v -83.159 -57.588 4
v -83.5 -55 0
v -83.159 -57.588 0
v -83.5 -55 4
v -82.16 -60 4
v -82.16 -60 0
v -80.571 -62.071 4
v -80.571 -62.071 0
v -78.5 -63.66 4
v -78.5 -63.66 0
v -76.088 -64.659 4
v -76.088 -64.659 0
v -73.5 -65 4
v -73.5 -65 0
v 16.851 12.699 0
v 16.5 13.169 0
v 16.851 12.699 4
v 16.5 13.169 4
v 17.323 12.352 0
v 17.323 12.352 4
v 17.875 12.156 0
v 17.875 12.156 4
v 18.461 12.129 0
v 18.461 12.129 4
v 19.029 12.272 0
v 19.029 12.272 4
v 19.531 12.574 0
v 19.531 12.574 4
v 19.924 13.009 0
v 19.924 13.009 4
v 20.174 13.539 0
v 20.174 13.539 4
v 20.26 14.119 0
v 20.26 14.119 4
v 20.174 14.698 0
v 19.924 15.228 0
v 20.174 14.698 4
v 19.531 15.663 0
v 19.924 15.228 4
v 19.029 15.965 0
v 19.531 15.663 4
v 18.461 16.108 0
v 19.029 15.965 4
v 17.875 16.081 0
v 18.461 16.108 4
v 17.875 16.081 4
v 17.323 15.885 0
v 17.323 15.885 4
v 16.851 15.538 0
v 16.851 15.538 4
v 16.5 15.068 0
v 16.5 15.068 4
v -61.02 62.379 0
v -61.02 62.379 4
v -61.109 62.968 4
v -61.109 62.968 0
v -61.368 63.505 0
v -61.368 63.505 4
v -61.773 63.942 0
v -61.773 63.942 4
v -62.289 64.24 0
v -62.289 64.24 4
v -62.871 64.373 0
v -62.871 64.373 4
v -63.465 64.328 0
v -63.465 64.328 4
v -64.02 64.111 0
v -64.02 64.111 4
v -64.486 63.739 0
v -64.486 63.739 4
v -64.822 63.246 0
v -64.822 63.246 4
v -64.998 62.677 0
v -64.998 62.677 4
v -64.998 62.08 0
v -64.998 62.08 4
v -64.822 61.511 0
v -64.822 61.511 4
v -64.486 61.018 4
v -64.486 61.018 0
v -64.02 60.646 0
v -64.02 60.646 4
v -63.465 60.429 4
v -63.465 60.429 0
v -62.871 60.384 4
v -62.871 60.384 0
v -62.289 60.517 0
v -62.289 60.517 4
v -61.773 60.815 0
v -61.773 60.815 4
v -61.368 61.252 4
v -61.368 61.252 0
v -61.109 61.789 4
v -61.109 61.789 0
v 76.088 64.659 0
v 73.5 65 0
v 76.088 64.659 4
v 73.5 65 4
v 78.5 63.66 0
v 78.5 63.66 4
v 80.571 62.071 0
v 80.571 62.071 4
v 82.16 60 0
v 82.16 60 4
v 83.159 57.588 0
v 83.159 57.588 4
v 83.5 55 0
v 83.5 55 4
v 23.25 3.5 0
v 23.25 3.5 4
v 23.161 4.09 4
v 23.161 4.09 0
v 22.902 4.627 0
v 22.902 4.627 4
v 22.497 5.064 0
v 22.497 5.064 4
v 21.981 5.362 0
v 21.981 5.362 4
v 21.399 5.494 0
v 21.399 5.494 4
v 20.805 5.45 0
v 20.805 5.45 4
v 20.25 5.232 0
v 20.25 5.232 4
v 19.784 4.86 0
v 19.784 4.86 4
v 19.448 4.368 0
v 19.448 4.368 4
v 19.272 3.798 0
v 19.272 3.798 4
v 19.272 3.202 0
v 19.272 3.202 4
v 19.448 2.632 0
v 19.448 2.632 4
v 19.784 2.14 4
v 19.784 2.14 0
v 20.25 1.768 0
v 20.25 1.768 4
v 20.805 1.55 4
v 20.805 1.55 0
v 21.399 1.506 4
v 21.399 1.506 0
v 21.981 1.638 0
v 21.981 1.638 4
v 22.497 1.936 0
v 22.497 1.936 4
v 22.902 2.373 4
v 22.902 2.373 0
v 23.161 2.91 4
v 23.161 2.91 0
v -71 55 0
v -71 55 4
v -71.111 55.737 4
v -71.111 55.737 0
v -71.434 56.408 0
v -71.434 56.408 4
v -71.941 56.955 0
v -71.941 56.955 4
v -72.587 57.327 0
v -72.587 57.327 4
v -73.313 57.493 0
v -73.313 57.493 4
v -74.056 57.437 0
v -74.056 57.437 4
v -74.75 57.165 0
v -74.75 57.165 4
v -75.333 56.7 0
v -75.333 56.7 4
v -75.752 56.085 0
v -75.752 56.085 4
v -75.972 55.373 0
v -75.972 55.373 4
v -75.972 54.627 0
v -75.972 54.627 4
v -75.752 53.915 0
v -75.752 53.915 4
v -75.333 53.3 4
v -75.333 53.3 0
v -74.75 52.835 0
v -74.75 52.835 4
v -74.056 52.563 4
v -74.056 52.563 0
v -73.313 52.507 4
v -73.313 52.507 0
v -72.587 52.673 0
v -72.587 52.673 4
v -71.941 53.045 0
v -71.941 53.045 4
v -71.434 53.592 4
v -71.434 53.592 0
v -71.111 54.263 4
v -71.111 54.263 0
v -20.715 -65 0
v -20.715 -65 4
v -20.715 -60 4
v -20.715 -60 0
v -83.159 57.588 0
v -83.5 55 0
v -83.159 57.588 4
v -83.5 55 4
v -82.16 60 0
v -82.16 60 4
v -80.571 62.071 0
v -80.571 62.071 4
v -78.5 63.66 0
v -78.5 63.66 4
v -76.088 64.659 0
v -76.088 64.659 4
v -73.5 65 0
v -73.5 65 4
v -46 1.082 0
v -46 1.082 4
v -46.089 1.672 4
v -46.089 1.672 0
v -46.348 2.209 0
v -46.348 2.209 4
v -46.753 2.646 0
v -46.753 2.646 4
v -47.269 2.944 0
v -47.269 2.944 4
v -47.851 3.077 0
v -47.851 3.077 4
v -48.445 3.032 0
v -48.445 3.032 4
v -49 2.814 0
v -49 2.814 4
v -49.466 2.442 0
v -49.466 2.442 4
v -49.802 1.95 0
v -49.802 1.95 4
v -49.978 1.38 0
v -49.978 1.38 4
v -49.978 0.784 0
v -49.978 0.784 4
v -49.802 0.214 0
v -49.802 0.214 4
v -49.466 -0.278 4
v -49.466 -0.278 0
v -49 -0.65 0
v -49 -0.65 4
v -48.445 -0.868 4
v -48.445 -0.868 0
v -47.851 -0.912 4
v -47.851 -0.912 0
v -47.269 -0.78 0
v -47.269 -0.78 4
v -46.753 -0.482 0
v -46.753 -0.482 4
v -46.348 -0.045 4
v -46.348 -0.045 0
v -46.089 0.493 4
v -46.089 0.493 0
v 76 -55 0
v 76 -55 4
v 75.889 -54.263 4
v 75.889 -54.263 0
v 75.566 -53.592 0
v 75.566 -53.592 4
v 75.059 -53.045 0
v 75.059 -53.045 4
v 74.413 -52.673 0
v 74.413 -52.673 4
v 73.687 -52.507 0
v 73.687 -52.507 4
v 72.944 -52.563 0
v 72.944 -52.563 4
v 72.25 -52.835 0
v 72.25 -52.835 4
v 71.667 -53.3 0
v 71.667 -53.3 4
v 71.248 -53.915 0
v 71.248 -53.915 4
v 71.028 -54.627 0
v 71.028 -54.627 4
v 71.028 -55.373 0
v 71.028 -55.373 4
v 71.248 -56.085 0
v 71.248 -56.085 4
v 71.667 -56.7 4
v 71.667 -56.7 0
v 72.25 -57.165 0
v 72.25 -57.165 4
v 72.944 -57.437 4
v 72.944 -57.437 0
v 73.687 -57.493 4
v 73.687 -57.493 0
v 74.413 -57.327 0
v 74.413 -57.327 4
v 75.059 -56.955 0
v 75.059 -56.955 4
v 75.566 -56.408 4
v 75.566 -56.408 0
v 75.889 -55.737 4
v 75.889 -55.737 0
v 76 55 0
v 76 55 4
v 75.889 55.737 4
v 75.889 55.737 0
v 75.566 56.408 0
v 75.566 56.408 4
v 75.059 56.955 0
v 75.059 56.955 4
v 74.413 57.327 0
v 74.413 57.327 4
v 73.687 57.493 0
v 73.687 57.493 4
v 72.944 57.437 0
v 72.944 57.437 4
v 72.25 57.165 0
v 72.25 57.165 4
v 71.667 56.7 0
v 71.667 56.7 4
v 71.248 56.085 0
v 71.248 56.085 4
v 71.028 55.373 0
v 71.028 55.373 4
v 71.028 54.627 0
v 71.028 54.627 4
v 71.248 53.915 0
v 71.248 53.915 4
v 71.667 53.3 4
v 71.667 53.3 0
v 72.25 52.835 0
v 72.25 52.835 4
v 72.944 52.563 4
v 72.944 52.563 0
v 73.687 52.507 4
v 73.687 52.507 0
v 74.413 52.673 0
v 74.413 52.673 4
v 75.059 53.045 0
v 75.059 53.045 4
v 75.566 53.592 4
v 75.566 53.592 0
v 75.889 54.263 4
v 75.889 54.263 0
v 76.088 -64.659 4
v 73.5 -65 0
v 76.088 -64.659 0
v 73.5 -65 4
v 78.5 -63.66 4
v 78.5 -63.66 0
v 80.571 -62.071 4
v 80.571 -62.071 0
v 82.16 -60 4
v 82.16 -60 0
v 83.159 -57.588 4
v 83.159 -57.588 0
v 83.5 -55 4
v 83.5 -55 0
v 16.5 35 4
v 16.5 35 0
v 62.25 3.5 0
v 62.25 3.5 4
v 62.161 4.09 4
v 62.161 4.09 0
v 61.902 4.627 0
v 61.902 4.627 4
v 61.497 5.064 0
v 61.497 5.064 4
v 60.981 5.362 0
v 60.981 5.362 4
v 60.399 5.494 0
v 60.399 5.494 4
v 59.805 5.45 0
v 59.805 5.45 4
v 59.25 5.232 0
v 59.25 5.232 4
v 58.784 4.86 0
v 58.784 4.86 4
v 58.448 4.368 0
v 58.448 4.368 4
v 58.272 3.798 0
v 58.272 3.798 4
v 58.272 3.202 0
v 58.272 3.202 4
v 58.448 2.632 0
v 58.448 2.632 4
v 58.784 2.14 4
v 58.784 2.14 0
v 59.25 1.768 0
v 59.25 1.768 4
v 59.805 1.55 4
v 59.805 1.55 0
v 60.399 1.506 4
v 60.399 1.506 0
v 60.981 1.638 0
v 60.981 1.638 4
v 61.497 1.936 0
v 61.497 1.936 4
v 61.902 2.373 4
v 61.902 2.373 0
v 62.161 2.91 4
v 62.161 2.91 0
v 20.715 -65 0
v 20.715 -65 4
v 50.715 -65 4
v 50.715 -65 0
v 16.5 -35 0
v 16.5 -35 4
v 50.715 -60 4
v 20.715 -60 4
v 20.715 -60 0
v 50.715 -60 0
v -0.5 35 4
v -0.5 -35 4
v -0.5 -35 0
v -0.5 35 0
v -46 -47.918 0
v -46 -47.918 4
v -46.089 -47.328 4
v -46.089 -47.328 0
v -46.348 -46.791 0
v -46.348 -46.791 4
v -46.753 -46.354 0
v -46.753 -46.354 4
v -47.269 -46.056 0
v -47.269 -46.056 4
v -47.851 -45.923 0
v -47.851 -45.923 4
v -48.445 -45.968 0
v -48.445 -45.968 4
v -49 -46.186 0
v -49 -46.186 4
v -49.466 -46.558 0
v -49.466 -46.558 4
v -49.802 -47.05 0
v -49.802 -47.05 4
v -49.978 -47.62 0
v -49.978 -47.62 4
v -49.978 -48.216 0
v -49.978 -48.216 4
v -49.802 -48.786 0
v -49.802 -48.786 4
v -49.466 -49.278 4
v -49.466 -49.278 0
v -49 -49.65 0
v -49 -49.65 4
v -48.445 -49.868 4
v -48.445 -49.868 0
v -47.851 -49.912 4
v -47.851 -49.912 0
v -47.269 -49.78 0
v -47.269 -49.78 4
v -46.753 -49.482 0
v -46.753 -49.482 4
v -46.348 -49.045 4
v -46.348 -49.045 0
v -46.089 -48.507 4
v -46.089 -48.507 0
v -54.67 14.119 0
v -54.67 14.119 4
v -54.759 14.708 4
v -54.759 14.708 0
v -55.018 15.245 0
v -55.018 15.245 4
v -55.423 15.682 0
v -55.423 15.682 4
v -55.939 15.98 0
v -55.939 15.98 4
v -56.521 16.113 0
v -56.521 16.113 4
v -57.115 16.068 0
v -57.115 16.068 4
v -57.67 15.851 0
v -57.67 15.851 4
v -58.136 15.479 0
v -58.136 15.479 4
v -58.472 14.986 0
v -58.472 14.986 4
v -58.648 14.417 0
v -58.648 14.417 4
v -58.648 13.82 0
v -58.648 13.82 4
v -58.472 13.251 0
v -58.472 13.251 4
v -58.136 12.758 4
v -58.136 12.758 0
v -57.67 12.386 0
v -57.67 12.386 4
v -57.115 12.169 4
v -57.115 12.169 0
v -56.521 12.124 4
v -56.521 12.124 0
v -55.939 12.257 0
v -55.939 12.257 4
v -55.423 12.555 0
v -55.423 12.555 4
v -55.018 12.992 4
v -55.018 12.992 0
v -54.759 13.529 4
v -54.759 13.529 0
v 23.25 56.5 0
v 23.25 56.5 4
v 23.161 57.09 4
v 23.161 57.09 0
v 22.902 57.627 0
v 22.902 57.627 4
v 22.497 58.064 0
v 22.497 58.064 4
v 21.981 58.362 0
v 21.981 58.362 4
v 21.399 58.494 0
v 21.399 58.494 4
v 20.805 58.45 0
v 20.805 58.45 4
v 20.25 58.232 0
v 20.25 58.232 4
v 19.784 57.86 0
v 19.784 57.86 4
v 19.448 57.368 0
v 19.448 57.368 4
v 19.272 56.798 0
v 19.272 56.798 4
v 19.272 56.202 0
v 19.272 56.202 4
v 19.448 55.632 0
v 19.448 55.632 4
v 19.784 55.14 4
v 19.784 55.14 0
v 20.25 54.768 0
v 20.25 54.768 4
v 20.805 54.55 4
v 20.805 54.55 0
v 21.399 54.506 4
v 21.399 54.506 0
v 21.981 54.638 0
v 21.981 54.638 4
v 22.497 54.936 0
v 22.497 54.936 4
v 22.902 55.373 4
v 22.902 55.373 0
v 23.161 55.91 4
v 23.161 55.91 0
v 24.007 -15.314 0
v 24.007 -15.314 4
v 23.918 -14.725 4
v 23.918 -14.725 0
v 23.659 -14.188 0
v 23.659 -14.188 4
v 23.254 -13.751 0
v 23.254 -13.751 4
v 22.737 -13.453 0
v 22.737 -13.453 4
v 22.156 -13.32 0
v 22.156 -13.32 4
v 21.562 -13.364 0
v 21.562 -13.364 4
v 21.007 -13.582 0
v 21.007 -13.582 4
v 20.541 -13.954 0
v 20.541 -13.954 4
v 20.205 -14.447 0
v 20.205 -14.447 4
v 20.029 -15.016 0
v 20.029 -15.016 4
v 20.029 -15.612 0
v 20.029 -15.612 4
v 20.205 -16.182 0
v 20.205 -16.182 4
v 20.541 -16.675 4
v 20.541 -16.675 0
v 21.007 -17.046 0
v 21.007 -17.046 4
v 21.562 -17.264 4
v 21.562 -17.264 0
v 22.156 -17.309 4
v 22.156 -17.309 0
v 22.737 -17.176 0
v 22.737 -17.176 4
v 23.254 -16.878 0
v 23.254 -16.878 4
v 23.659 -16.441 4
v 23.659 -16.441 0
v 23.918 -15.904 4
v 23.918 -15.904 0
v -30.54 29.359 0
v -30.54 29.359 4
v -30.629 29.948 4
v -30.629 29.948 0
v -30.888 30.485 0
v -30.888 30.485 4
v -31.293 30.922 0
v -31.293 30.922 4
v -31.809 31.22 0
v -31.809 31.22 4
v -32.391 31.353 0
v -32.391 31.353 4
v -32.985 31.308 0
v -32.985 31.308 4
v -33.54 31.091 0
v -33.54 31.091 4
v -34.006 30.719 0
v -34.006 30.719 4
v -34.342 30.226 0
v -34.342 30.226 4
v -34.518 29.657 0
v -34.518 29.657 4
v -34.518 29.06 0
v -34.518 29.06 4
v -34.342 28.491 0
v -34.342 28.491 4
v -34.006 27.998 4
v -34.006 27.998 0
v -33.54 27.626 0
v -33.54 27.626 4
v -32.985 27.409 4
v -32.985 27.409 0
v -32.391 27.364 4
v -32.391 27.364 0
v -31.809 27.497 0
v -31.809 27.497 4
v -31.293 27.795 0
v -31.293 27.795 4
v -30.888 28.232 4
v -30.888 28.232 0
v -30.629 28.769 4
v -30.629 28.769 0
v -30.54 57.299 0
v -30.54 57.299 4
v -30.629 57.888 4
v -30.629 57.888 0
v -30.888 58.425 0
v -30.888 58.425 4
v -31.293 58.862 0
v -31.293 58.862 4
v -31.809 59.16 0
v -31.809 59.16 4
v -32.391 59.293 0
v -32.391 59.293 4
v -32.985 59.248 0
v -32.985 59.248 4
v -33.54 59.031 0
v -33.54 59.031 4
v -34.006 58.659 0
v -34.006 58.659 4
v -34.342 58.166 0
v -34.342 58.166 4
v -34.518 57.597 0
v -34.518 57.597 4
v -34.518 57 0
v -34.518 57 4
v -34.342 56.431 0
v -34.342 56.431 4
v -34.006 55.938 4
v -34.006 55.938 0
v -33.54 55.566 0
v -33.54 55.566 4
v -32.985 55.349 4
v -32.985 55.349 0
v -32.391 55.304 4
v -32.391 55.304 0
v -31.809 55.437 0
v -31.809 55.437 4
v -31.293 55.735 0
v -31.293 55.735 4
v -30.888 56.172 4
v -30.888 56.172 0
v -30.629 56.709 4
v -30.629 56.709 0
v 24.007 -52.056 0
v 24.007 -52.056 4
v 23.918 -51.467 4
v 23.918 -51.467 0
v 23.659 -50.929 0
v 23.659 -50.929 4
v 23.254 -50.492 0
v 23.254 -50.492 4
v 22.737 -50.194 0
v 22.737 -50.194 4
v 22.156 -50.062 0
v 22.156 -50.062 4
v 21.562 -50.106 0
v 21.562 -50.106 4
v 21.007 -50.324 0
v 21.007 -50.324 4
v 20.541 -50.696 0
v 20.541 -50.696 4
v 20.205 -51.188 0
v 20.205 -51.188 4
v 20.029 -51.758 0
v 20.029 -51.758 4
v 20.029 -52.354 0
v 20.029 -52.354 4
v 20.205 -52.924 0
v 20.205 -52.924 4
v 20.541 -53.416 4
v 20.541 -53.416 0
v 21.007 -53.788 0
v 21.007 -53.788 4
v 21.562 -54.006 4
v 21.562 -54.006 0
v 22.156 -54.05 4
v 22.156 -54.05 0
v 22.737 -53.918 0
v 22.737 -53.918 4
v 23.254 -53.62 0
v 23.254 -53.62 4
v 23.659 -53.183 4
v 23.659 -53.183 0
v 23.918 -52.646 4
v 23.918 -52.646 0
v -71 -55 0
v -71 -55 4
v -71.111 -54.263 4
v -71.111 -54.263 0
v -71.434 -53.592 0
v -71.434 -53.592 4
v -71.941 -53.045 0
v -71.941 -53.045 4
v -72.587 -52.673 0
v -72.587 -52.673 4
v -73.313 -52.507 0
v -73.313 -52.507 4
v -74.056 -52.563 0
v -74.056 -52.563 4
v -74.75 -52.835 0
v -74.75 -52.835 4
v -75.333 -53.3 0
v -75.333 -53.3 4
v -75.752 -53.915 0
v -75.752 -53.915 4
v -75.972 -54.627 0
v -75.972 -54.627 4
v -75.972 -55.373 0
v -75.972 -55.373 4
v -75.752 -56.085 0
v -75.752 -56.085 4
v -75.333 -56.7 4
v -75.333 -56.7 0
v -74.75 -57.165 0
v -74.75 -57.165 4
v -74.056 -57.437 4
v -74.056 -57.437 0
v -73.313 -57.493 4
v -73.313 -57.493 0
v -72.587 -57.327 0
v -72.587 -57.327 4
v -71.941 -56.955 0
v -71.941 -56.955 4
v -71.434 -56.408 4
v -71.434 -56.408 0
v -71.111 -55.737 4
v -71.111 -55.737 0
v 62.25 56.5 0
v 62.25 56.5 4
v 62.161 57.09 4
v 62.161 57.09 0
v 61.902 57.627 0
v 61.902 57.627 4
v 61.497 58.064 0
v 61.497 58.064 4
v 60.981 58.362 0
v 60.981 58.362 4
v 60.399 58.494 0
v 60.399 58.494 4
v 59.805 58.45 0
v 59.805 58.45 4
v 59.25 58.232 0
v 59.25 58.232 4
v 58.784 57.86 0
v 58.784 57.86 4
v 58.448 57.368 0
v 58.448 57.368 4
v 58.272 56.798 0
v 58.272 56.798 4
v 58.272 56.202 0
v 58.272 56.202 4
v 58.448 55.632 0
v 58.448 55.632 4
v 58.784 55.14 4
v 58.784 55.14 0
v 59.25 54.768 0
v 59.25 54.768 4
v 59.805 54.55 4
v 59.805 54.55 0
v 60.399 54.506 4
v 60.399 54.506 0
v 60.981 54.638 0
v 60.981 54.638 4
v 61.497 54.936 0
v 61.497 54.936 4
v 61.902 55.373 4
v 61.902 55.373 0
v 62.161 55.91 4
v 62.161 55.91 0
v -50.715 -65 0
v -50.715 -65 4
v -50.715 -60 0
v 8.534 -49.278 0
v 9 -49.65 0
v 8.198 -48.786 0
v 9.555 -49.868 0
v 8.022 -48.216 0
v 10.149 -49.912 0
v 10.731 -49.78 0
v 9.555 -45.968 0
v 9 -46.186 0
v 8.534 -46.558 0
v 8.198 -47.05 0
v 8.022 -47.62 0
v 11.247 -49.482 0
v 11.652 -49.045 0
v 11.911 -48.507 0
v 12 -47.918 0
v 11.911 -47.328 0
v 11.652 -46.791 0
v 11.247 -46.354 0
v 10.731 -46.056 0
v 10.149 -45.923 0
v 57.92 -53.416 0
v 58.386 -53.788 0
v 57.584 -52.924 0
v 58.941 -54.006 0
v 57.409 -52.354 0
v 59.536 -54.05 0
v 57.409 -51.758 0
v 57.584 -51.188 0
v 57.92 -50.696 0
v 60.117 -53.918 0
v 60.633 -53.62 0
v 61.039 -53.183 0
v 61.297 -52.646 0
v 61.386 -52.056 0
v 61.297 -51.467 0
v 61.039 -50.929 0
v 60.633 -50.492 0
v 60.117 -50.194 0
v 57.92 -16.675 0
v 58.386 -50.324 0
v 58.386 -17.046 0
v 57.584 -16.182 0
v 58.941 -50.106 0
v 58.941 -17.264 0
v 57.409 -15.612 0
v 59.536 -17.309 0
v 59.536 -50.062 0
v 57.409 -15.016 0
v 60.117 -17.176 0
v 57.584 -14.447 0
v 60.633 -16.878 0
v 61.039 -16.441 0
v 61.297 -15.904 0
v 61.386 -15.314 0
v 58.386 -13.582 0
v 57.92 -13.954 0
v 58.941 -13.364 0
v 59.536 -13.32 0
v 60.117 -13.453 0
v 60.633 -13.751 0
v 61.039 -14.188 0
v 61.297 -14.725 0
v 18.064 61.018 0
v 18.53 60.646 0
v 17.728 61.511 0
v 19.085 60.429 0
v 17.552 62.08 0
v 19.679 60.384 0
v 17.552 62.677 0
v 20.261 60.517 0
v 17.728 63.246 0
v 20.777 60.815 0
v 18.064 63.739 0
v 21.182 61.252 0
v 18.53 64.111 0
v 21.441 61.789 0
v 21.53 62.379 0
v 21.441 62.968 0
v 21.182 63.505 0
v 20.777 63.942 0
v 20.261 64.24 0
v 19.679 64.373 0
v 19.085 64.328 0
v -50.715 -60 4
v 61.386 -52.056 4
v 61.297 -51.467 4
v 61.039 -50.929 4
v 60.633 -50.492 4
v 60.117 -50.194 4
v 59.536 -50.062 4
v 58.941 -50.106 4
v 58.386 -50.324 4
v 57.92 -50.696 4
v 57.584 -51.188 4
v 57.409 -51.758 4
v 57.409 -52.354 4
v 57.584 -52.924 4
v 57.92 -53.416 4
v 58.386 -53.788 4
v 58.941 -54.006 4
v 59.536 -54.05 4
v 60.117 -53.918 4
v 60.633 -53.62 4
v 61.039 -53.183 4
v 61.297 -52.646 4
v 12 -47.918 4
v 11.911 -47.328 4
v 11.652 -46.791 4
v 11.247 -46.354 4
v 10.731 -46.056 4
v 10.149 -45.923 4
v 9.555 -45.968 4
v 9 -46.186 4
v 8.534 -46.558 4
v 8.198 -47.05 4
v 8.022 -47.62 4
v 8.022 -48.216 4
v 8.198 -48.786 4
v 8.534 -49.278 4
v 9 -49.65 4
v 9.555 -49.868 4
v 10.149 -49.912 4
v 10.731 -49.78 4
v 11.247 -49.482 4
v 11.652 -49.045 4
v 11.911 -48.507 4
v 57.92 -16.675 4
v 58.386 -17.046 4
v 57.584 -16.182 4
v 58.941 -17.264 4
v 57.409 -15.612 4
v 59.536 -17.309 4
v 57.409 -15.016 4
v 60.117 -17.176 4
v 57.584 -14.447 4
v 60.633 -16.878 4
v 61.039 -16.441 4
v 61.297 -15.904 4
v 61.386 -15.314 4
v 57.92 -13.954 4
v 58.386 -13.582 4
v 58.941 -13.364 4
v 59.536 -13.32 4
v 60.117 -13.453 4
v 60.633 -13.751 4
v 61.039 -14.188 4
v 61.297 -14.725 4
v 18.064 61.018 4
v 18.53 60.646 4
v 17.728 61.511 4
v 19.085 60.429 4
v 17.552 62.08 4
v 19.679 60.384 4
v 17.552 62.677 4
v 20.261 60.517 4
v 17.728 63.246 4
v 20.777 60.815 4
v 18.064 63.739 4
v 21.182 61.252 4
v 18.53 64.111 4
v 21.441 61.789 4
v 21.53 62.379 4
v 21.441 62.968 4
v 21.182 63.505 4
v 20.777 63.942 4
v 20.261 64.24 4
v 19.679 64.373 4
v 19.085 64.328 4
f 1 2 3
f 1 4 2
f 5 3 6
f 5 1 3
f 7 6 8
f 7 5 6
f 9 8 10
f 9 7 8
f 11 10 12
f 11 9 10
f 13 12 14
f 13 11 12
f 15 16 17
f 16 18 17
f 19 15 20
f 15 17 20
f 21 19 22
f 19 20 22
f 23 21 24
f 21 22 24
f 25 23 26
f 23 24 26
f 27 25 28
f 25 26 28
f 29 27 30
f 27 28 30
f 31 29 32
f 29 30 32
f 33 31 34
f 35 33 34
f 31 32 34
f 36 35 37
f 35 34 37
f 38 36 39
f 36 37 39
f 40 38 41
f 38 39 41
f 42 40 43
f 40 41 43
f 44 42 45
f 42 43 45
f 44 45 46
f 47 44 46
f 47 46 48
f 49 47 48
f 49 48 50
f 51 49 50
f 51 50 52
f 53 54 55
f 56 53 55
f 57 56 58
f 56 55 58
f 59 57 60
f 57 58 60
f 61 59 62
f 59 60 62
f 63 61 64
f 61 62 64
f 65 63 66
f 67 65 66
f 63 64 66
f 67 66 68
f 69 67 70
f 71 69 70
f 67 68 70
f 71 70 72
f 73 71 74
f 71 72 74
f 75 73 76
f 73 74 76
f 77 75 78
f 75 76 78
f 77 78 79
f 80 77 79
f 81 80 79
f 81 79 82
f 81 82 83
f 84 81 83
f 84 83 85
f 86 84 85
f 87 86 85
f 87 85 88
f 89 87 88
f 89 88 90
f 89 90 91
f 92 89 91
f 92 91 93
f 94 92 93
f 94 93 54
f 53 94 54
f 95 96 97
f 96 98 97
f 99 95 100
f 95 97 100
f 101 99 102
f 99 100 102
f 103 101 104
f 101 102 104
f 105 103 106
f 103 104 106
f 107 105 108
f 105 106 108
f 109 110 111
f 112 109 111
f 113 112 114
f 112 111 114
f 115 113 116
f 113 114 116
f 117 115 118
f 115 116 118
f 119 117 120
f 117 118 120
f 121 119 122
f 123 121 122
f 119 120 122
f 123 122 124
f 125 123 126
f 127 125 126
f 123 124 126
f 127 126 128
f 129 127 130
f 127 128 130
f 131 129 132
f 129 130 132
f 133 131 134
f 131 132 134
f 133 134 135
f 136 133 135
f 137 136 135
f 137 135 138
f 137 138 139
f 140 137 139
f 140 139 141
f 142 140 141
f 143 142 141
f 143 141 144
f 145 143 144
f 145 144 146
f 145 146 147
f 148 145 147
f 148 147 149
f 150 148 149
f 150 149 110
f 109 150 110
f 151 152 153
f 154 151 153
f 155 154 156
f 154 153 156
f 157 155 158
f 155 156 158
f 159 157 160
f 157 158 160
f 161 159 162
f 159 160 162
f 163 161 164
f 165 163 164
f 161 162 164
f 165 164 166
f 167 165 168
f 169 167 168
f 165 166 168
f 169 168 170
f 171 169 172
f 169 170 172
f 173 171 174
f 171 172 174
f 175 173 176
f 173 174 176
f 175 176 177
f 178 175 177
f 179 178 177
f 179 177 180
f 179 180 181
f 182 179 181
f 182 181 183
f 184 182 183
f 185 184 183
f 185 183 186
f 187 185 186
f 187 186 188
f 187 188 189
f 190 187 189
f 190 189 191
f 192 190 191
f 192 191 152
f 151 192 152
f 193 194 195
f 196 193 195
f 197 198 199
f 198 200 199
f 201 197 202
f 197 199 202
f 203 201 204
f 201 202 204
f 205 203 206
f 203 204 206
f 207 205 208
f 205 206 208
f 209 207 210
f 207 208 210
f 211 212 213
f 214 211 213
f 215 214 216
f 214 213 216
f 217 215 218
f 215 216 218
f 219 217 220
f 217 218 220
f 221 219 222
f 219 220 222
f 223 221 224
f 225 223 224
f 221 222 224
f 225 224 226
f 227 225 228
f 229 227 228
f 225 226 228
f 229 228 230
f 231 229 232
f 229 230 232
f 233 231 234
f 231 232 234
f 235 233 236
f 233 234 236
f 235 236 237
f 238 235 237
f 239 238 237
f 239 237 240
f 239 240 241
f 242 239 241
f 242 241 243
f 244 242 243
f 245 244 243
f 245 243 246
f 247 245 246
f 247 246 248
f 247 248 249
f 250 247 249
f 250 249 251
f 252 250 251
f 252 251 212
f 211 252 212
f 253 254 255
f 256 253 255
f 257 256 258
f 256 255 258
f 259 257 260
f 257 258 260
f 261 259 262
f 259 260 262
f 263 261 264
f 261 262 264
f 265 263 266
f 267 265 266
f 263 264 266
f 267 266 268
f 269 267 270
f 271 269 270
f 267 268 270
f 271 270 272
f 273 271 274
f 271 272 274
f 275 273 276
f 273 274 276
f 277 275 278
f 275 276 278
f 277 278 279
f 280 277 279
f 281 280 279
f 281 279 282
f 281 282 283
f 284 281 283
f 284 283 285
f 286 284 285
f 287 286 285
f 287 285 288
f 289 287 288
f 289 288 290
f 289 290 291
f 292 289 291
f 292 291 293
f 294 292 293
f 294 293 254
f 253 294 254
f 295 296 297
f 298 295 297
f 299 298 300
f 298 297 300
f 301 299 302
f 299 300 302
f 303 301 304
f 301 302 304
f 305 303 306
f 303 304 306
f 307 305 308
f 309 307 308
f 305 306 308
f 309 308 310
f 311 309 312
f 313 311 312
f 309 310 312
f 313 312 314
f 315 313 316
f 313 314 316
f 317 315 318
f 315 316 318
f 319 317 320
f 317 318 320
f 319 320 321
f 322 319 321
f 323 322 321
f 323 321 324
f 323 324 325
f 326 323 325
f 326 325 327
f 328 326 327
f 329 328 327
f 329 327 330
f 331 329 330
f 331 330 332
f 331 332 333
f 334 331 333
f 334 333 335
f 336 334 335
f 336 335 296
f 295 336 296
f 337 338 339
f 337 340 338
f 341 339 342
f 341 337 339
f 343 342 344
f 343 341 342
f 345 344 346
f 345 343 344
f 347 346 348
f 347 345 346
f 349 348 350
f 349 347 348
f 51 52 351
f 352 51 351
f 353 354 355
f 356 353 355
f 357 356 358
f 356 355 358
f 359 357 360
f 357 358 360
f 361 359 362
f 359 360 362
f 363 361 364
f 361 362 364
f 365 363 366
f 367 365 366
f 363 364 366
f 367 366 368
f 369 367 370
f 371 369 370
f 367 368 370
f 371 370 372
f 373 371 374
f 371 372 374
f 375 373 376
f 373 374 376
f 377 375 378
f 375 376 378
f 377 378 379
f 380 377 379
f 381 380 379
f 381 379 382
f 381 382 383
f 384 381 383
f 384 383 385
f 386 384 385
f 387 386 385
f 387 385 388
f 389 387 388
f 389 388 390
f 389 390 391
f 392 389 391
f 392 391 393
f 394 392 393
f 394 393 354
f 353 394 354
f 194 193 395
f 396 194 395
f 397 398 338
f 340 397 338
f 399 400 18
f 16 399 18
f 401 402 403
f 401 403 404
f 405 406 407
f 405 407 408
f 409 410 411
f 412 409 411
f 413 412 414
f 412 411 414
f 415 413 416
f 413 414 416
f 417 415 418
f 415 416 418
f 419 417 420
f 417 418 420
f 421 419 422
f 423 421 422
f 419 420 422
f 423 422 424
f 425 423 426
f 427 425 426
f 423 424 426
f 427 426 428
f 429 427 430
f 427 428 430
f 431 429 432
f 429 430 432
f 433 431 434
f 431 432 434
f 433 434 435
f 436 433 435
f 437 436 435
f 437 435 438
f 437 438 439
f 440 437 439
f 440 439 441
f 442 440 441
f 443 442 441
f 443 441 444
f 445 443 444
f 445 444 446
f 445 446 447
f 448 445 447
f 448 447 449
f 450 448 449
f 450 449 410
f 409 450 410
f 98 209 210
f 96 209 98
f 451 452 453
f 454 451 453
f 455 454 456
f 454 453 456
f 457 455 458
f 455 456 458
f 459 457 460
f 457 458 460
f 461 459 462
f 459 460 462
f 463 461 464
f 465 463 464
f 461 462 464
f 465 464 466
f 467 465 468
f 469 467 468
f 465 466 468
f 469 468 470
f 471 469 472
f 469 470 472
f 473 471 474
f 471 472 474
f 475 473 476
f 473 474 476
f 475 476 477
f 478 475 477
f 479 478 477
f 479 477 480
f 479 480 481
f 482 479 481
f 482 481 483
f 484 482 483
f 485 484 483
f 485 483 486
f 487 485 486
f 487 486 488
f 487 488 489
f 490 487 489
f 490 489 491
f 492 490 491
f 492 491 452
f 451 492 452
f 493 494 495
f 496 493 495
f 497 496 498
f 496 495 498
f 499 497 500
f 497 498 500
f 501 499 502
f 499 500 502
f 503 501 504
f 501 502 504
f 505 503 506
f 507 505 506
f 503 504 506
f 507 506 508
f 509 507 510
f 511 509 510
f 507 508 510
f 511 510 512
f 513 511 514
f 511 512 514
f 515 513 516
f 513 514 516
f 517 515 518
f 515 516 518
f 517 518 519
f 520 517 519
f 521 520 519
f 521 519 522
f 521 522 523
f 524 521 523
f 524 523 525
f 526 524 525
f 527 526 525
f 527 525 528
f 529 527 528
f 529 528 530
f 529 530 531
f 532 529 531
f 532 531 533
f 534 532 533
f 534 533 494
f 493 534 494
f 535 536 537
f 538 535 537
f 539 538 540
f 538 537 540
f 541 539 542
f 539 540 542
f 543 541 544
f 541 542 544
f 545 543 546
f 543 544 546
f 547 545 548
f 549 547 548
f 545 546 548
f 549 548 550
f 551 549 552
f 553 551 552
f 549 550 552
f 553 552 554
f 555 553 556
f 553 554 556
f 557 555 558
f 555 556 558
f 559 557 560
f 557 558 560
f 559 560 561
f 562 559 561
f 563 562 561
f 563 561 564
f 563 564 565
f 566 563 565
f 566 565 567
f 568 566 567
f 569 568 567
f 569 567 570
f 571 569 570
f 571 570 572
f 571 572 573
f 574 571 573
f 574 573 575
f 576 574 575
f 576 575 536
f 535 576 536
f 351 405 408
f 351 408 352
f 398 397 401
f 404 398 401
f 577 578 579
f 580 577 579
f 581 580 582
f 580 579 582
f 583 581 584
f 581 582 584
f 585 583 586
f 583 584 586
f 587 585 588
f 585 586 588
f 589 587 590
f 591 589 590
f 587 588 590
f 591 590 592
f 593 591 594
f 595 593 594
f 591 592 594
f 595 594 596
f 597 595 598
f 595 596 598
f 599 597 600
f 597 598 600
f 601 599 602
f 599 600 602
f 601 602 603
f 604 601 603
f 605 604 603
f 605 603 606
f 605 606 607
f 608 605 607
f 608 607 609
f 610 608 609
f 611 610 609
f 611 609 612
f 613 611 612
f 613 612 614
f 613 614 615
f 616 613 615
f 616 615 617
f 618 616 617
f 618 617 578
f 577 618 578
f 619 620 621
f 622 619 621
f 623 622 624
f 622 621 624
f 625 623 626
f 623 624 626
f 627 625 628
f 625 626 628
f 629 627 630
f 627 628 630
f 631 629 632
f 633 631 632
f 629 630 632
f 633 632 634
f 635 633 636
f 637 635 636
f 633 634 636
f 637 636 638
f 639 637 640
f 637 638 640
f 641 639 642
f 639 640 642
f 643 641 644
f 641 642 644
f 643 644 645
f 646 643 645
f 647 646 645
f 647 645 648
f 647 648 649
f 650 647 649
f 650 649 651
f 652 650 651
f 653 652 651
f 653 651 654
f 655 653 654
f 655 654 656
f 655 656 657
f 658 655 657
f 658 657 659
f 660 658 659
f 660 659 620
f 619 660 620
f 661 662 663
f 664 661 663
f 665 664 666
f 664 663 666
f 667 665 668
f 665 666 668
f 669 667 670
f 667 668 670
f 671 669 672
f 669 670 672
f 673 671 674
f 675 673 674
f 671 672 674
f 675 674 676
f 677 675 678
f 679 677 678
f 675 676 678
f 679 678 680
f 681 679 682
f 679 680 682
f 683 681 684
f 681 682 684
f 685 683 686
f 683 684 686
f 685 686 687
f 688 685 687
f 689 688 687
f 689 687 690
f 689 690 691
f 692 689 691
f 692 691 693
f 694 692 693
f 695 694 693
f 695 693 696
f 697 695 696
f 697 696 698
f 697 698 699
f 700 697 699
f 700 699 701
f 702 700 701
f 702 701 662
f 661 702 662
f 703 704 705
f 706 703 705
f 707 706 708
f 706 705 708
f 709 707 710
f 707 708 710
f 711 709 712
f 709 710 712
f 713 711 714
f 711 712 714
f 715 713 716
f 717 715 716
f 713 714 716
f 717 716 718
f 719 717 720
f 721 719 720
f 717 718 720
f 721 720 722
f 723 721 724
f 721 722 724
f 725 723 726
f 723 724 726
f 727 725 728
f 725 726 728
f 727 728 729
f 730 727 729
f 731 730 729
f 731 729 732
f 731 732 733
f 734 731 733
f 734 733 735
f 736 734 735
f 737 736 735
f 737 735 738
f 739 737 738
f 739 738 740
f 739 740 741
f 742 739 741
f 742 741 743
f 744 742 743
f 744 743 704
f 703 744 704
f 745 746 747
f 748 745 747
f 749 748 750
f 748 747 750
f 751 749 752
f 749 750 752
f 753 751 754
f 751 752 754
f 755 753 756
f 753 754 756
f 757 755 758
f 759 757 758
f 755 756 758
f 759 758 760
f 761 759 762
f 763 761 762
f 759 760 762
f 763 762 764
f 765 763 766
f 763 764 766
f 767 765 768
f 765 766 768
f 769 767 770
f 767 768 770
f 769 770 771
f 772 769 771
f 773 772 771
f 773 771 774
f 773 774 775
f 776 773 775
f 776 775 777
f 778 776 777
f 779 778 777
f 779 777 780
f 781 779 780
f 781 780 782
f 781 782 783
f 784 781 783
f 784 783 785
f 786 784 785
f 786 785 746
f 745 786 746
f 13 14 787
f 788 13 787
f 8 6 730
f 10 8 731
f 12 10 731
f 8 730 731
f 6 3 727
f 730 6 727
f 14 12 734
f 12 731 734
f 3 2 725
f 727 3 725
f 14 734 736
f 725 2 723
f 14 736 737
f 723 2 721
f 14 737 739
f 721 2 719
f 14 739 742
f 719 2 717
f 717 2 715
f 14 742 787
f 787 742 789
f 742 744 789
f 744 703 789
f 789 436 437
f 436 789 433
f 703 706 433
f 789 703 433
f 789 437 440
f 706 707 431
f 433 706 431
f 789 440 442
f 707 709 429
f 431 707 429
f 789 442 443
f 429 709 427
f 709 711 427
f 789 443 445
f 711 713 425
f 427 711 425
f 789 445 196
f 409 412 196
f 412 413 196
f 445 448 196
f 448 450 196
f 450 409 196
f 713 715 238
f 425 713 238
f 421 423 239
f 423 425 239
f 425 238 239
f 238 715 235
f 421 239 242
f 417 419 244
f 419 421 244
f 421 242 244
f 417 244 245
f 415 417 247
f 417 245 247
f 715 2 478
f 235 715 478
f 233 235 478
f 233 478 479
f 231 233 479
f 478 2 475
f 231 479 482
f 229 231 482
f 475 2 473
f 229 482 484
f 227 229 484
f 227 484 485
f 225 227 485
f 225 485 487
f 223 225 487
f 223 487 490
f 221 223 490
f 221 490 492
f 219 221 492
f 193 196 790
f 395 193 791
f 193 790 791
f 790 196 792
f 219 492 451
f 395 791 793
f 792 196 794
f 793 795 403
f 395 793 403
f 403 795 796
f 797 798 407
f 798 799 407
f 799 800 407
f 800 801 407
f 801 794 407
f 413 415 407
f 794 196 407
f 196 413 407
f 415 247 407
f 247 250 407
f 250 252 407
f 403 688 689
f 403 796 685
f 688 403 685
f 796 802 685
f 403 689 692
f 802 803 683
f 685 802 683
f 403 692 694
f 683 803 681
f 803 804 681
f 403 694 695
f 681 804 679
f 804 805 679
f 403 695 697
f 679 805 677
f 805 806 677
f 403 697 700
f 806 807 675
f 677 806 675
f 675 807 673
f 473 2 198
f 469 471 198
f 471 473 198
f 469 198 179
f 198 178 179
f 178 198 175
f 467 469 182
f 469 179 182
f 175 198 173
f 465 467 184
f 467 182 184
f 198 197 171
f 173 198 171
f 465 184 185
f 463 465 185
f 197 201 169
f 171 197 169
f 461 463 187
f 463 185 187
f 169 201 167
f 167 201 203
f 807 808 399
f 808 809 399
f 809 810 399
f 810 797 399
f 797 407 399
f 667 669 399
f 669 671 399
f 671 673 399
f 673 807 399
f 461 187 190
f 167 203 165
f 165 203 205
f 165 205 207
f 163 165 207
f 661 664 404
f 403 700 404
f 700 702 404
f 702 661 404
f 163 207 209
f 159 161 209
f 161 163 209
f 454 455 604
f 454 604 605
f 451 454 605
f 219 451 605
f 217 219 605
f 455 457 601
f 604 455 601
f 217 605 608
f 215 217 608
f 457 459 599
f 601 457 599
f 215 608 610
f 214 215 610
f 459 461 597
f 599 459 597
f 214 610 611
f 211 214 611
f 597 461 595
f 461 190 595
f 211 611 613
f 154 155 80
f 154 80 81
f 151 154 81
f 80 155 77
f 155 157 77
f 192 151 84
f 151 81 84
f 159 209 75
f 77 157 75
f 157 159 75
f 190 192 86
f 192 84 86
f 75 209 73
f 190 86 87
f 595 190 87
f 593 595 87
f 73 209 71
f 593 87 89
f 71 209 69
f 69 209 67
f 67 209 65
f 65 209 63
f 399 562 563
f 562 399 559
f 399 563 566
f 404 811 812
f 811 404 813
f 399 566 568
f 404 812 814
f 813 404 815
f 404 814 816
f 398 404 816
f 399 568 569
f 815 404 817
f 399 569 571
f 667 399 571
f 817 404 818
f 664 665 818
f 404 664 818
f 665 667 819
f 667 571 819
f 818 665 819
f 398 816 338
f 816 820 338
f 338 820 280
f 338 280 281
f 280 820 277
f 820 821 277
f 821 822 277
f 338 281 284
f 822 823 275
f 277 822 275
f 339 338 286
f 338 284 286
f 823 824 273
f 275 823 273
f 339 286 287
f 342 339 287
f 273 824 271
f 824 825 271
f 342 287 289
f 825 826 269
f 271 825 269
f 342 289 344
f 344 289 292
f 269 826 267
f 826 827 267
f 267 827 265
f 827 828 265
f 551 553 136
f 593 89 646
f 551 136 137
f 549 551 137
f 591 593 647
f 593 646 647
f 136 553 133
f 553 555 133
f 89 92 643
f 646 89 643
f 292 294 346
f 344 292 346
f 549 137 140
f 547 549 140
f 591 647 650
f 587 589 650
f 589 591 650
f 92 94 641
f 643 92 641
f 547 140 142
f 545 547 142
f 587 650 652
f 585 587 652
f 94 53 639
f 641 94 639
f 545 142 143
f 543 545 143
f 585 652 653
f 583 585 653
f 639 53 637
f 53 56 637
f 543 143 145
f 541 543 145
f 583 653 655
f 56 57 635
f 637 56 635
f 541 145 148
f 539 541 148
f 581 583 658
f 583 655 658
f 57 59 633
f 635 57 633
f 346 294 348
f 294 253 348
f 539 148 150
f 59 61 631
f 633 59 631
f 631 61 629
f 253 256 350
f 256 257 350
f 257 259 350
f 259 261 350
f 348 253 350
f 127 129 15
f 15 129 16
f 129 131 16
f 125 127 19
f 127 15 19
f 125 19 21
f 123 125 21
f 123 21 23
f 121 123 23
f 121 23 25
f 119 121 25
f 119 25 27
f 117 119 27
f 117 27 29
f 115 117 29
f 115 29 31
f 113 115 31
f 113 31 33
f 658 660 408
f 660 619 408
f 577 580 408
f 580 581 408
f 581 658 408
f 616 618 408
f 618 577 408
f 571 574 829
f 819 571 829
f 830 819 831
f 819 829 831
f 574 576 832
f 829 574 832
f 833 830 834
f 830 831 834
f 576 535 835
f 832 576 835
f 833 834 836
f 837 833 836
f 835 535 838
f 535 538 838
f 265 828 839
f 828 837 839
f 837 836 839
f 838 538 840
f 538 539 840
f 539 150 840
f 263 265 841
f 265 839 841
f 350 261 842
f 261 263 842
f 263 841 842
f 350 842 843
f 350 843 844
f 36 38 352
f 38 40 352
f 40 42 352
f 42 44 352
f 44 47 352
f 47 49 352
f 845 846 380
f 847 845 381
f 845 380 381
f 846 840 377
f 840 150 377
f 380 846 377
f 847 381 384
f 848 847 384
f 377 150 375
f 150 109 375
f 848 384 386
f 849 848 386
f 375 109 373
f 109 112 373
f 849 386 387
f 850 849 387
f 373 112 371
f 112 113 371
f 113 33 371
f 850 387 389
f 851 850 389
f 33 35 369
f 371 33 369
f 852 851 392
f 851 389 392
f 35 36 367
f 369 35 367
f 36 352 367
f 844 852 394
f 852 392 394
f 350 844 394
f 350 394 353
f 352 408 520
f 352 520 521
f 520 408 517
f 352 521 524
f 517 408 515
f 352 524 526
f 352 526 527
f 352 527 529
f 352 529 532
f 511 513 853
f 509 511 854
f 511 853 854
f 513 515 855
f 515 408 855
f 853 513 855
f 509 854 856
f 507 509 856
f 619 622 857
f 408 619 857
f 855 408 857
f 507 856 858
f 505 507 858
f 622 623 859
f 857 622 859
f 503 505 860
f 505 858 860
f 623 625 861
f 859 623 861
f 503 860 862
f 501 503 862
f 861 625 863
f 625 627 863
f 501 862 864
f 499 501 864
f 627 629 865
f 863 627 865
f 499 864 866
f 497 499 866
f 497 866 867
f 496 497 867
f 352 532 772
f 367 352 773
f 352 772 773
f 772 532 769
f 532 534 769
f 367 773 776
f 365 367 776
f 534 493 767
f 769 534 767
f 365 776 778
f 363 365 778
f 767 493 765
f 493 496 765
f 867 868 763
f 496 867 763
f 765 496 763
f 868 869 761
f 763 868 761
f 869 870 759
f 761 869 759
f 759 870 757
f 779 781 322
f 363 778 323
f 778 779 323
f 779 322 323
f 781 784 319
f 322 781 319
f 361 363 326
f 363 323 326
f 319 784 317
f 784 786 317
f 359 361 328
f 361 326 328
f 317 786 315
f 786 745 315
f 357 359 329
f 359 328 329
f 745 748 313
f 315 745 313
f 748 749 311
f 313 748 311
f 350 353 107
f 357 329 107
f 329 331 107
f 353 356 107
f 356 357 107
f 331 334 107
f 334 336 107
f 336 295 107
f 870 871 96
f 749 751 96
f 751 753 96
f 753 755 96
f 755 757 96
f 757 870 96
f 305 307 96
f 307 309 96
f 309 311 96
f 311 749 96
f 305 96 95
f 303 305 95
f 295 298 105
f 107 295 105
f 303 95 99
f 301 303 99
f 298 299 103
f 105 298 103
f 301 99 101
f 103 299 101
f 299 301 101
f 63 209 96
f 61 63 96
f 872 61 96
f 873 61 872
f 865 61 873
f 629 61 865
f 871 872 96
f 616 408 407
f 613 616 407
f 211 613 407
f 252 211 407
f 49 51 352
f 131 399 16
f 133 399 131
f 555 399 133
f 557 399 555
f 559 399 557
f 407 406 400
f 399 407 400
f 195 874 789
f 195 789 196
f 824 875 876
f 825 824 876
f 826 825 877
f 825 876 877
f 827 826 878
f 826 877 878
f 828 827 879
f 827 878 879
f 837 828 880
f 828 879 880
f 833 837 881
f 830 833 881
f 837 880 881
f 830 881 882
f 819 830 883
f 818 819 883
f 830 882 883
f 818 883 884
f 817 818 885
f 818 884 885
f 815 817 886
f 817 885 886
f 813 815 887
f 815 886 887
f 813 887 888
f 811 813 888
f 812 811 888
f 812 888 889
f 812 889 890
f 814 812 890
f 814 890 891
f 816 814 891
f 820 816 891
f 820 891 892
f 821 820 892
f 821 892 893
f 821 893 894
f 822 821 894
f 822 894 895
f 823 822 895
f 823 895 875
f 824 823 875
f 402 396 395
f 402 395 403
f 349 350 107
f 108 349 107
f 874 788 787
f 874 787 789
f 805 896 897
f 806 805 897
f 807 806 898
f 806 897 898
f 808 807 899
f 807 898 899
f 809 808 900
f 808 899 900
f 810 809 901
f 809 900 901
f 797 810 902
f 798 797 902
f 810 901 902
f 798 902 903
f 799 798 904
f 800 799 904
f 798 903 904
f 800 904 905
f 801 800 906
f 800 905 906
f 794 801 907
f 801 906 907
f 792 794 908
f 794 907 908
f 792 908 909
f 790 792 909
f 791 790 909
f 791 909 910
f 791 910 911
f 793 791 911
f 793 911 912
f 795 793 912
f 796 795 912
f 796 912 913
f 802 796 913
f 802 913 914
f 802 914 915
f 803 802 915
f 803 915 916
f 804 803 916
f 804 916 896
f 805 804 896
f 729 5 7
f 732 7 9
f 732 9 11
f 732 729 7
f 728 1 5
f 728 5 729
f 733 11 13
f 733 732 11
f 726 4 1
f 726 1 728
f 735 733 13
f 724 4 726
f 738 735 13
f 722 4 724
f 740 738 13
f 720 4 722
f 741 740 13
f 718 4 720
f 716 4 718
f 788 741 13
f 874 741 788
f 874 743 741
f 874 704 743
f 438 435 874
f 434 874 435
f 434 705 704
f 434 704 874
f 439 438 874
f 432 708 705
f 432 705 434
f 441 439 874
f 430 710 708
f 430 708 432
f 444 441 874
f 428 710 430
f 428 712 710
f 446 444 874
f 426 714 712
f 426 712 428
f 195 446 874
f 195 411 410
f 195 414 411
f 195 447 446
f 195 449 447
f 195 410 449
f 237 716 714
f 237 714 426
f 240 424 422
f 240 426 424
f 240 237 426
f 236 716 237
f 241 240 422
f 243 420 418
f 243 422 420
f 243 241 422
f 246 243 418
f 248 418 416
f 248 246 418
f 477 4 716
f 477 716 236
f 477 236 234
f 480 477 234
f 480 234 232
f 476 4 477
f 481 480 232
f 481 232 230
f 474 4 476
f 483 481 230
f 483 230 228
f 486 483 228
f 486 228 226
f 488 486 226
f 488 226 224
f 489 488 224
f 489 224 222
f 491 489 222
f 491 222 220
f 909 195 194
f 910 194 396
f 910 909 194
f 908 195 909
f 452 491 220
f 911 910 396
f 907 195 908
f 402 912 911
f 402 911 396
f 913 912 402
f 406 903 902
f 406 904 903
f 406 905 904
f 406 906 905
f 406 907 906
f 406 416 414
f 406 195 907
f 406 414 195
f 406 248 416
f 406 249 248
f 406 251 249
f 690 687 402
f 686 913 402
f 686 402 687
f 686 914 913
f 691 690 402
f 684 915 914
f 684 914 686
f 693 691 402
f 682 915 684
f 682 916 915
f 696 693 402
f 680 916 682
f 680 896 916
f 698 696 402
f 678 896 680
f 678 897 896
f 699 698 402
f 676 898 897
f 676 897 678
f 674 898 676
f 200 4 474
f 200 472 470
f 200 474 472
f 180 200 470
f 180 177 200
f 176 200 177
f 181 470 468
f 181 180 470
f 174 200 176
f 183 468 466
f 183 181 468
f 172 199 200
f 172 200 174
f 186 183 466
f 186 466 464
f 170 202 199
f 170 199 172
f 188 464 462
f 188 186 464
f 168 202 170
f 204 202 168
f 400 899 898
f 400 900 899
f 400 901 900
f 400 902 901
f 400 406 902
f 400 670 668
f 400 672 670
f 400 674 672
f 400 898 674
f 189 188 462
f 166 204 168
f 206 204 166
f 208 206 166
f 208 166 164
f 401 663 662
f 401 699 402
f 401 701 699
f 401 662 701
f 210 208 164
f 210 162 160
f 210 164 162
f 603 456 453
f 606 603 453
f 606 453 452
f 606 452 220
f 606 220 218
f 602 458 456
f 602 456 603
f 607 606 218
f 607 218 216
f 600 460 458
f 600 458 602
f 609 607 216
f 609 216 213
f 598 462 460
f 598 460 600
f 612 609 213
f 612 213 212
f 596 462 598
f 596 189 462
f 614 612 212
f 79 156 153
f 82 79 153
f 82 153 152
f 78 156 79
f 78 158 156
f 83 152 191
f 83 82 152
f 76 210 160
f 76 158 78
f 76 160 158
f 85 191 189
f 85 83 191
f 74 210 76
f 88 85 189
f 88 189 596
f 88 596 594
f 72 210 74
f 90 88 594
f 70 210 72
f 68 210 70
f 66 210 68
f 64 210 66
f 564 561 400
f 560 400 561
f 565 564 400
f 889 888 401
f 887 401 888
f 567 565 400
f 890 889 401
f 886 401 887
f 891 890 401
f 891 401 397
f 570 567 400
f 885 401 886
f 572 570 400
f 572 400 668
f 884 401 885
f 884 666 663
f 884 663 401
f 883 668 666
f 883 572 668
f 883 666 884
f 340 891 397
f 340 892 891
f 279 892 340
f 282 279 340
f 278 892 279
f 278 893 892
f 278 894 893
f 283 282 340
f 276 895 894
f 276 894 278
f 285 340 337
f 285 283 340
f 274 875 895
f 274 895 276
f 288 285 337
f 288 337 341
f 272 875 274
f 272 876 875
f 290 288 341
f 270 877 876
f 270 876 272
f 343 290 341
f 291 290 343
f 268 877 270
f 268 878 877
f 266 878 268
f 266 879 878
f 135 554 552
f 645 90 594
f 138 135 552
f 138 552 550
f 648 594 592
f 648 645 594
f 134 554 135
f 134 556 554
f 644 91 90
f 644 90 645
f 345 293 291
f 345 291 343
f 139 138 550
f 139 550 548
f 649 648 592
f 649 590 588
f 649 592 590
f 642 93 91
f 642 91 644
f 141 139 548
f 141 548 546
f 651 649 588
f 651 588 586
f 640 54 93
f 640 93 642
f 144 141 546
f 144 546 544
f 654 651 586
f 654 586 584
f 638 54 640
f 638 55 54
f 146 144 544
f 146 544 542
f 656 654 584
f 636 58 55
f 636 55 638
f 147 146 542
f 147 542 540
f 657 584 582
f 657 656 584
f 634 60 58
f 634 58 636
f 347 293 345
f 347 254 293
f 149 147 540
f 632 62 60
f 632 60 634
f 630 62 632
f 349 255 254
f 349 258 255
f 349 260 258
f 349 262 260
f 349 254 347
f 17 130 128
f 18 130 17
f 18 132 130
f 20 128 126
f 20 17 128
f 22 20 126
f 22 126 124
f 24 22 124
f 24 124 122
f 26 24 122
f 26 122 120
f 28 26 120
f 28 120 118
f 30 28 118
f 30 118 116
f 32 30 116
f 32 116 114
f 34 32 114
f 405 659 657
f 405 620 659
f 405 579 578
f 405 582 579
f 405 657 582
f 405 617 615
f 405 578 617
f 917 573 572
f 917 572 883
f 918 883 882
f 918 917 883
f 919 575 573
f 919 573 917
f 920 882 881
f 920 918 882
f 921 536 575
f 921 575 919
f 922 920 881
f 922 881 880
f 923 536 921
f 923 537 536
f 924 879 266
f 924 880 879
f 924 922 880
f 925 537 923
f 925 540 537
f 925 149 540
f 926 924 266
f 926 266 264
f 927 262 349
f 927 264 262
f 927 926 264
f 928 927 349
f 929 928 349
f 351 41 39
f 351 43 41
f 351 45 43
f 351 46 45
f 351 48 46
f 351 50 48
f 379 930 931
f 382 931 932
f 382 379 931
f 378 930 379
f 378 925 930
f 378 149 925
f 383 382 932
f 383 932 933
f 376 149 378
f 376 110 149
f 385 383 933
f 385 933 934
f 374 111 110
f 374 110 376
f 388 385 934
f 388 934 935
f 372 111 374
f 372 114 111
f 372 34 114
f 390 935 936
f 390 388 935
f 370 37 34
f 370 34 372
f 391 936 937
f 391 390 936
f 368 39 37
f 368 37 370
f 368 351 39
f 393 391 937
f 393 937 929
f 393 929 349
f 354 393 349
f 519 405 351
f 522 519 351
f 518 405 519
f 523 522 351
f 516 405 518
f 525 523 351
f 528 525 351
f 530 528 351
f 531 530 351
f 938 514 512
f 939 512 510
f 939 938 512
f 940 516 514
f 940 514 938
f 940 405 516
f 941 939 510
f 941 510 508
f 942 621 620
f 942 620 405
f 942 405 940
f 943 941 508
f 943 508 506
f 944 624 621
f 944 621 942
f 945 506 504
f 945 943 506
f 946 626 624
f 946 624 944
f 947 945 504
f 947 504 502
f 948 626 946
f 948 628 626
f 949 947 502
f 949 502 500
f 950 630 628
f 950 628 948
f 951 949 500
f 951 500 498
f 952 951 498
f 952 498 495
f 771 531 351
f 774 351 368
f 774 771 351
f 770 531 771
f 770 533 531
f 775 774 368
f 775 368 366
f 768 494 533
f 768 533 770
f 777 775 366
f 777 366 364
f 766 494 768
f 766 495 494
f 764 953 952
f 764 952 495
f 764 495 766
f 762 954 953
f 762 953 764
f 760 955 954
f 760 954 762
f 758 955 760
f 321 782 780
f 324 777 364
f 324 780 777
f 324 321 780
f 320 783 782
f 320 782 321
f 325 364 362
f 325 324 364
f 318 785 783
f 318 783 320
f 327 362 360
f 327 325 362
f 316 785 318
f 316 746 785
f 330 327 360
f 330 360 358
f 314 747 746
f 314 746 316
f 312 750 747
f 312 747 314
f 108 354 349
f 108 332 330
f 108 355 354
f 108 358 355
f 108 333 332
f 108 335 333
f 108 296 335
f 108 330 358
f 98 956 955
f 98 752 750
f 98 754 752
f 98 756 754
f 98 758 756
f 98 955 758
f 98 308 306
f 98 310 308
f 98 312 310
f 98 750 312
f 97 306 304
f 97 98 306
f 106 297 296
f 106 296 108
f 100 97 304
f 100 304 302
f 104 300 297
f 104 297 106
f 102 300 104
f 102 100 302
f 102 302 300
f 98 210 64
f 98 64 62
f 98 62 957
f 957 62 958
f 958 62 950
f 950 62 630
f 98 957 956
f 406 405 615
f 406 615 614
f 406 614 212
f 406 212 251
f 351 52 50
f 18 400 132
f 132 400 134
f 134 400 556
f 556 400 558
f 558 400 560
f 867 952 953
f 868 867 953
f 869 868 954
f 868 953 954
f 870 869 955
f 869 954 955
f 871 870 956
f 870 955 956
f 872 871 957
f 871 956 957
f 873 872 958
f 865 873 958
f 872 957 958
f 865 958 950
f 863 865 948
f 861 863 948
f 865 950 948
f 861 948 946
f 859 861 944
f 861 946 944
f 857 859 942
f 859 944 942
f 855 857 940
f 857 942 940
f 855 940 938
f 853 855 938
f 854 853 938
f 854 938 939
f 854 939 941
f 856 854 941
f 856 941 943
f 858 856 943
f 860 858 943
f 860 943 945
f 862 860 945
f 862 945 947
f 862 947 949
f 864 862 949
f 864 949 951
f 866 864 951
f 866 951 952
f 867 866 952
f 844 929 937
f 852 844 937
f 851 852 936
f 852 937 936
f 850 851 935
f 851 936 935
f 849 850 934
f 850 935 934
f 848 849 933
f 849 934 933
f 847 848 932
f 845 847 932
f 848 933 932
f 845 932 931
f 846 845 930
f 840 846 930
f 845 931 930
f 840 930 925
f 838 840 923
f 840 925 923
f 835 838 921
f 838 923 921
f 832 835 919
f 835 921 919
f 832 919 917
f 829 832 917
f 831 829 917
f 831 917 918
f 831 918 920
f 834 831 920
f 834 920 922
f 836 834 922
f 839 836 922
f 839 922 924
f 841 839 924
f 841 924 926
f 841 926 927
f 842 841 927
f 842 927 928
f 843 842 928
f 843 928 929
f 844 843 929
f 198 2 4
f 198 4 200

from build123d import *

# Parameters (mm, degrees)
SKETCH1_W           = 167
SKETCH1_H           = 130
BOSS_EXTRUDE1_DEPTH = 4
FILLET1_R           = 10
FILLET2_R           = 10
SKETCH5_R           = 2.5
CUT_EXTRUDE4_DEPTH  = 70
SKETCH6_W           = 30
SKETCH6_H           = 5
CUT_EXTRUDE5_DEPTH  = 10
SKETCH7_R           = 2
CUT_EXTRUDE6_DEPTH  = 106.892634305
SKETCH8_R           = 2
CUT_EXTRUDE7_DEPTH  = 106.892634305
SKETCH9_W           = 17
SKETCH9_H           = 70
CUT_EXTRUDE8_DEPTH  = 106.892634305
SKETCH10_R          = 2
CUT_EXTRUDE9_DEPTH  = 106.892634305
SKETCH11_R          = 2
CUT_EXTRUDE10_DEPTH = 106.892634305


with BuildPart() as part:
    # Sketch1 → Boss-Extrude1 (new body)
    with BuildSketch(Plane.XY):
        Rectangle(SKETCH1_W, SKETCH1_H)
    extrude(amount=BOSS_EXTRUDE1_DEPTH)

    # Fillet1
    fillet1_edges = [part.edges().sort_by_distance(p)[0] for p in [
        (-83.5, -65, 2),
        (-83.5, 65, 2),
    ]]
    fillet(fillet1_edges, radius=FILLET1_R)

    # Fillet2
    fillet2_edges = [part.edges().sort_by_distance(p)[0] for p in [
        (83.5, -65, 2),
        (83.5, 65, 2),
    ]]
    fillet(fillet2_edges, radius=FILLET2_R)

    # Sketch5 → Cut-Extrude4 (cut)
    with BuildSketch(Plane.XY.offset(4)):
        with Locations((-73.5, 55)):
            Circle(SKETCH5_R)
        with Locations((73.5, 55)):
            Circle(SKETCH5_R)
        with Locations((-73.5, -55)):
            Circle(SKETCH5_R)
        with Locations((73.5, -55)):
            Circle(SKETCH5_R)
    extrude(amount=-CUT_EXTRUDE4_DEPTH, mode=Mode.SUBTRACT)

    # Sketch6 → Cut-Extrude5 (cut)
    with BuildSketch(Plane.XY.offset(4)):
        with Locations((-35.714992286, -62.5)):
            Rectangle(SKETCH6_W, SKETCH6_H)
        with Locations((35.714992286, -62.5)):
            Rectangle(SKETCH6_W, SKETCH6_H)
    extrude(amount=-CUT_EXTRUDE5_DEPTH, mode=Mode.SUBTRACT)

    # Sketch7 → Cut-Extrude6 (cut, through all)
    with BuildSketch(Plane.XY.offset(4)):
        with Locations((22.006812394, -15.314288265)):
            Circle(SKETCH7_R)
        with Locations((59.386313266, -15.314288265)):
            Circle(SKETCH7_R)
        with Locations((59.386313266, -52.056088589)):
            Circle(SKETCH7_R)
        with Locations((22.006812394, -52.056088589)):
            Circle(SKETCH7_R)
    extrude(amount=-CUT_EXTRUDE6_DEPTH, mode=Mode.SUBTRACT)

    # Sketch8 → Cut-Extrude7 (cut, through all)
    with BuildSketch(Plane.XY.offset(4)):
        with Locations((21.25, 56.5)):
            Circle(SKETCH8_R)
        with Locations((60.25, 56.5)):
            Circle(SKETCH8_R)
        with Locations((60.25, 3.5)):
            Circle(SKETCH8_R)
        with Locations((21.25, 3.5)):
            Circle(SKETCH8_R)
    extrude(amount=-CUT_EXTRUDE7_DEPTH, mode=Mode.SUBTRACT)

    # Sketch9 → Cut-Extrude8 (cut, through all)
    with BuildSketch(Plane.XY.offset(4)):
        with Locations((8, 0)):
            Rectangle(SKETCH9_W, SKETCH9_H)
    extrude(amount=-CUT_EXTRUDE8_DEPTH, mode=Mode.SUBTRACT)

    # Sketch10 → Cut-Extrude9 (cut, through all)
    with BuildSketch(Plane.XY.offset(4)):
        with Locations((-48, 1.082115111)):
            Circle(SKETCH10_R)
        with Locations((10, -47.917884889)):
            Circle(SKETCH10_R)
        with Locations((-48, -47.917884889)):
            Circle(SKETCH10_R)
        with Locations((10, 1.082115111)):
            Circle(SKETCH10_R)
    extrude(amount=-CUT_EXTRUDE9_DEPTH, mode=Mode.SUBTRACT)

    # Sketch11 → Cut-Extrude10 (cut, through all)
    with BuildSketch(Plane.XY.offset(4)):
        with Locations((-63.02, 62.378539804)):
            Circle(SKETCH11_R)
        with Locations((-32.54, 57.298539804)):
            Circle(SKETCH11_R)
        with Locations((-32.54, 29.358539804)):
            Circle(SKETCH11_R)
        with Locations((19.53, 62.378539804)):
            Circle(SKETCH11_R)
        with Locations((18.26, 14.118539804)):
            Circle(SKETCH11_R)
        with Locations((-56.67, 14.118539804)):
            Circle(SKETCH11_R)
    extrude(amount=-CUT_EXTRUDE10_DEPTH, mode=Mode.SUBTRACT)


solid = part.part
